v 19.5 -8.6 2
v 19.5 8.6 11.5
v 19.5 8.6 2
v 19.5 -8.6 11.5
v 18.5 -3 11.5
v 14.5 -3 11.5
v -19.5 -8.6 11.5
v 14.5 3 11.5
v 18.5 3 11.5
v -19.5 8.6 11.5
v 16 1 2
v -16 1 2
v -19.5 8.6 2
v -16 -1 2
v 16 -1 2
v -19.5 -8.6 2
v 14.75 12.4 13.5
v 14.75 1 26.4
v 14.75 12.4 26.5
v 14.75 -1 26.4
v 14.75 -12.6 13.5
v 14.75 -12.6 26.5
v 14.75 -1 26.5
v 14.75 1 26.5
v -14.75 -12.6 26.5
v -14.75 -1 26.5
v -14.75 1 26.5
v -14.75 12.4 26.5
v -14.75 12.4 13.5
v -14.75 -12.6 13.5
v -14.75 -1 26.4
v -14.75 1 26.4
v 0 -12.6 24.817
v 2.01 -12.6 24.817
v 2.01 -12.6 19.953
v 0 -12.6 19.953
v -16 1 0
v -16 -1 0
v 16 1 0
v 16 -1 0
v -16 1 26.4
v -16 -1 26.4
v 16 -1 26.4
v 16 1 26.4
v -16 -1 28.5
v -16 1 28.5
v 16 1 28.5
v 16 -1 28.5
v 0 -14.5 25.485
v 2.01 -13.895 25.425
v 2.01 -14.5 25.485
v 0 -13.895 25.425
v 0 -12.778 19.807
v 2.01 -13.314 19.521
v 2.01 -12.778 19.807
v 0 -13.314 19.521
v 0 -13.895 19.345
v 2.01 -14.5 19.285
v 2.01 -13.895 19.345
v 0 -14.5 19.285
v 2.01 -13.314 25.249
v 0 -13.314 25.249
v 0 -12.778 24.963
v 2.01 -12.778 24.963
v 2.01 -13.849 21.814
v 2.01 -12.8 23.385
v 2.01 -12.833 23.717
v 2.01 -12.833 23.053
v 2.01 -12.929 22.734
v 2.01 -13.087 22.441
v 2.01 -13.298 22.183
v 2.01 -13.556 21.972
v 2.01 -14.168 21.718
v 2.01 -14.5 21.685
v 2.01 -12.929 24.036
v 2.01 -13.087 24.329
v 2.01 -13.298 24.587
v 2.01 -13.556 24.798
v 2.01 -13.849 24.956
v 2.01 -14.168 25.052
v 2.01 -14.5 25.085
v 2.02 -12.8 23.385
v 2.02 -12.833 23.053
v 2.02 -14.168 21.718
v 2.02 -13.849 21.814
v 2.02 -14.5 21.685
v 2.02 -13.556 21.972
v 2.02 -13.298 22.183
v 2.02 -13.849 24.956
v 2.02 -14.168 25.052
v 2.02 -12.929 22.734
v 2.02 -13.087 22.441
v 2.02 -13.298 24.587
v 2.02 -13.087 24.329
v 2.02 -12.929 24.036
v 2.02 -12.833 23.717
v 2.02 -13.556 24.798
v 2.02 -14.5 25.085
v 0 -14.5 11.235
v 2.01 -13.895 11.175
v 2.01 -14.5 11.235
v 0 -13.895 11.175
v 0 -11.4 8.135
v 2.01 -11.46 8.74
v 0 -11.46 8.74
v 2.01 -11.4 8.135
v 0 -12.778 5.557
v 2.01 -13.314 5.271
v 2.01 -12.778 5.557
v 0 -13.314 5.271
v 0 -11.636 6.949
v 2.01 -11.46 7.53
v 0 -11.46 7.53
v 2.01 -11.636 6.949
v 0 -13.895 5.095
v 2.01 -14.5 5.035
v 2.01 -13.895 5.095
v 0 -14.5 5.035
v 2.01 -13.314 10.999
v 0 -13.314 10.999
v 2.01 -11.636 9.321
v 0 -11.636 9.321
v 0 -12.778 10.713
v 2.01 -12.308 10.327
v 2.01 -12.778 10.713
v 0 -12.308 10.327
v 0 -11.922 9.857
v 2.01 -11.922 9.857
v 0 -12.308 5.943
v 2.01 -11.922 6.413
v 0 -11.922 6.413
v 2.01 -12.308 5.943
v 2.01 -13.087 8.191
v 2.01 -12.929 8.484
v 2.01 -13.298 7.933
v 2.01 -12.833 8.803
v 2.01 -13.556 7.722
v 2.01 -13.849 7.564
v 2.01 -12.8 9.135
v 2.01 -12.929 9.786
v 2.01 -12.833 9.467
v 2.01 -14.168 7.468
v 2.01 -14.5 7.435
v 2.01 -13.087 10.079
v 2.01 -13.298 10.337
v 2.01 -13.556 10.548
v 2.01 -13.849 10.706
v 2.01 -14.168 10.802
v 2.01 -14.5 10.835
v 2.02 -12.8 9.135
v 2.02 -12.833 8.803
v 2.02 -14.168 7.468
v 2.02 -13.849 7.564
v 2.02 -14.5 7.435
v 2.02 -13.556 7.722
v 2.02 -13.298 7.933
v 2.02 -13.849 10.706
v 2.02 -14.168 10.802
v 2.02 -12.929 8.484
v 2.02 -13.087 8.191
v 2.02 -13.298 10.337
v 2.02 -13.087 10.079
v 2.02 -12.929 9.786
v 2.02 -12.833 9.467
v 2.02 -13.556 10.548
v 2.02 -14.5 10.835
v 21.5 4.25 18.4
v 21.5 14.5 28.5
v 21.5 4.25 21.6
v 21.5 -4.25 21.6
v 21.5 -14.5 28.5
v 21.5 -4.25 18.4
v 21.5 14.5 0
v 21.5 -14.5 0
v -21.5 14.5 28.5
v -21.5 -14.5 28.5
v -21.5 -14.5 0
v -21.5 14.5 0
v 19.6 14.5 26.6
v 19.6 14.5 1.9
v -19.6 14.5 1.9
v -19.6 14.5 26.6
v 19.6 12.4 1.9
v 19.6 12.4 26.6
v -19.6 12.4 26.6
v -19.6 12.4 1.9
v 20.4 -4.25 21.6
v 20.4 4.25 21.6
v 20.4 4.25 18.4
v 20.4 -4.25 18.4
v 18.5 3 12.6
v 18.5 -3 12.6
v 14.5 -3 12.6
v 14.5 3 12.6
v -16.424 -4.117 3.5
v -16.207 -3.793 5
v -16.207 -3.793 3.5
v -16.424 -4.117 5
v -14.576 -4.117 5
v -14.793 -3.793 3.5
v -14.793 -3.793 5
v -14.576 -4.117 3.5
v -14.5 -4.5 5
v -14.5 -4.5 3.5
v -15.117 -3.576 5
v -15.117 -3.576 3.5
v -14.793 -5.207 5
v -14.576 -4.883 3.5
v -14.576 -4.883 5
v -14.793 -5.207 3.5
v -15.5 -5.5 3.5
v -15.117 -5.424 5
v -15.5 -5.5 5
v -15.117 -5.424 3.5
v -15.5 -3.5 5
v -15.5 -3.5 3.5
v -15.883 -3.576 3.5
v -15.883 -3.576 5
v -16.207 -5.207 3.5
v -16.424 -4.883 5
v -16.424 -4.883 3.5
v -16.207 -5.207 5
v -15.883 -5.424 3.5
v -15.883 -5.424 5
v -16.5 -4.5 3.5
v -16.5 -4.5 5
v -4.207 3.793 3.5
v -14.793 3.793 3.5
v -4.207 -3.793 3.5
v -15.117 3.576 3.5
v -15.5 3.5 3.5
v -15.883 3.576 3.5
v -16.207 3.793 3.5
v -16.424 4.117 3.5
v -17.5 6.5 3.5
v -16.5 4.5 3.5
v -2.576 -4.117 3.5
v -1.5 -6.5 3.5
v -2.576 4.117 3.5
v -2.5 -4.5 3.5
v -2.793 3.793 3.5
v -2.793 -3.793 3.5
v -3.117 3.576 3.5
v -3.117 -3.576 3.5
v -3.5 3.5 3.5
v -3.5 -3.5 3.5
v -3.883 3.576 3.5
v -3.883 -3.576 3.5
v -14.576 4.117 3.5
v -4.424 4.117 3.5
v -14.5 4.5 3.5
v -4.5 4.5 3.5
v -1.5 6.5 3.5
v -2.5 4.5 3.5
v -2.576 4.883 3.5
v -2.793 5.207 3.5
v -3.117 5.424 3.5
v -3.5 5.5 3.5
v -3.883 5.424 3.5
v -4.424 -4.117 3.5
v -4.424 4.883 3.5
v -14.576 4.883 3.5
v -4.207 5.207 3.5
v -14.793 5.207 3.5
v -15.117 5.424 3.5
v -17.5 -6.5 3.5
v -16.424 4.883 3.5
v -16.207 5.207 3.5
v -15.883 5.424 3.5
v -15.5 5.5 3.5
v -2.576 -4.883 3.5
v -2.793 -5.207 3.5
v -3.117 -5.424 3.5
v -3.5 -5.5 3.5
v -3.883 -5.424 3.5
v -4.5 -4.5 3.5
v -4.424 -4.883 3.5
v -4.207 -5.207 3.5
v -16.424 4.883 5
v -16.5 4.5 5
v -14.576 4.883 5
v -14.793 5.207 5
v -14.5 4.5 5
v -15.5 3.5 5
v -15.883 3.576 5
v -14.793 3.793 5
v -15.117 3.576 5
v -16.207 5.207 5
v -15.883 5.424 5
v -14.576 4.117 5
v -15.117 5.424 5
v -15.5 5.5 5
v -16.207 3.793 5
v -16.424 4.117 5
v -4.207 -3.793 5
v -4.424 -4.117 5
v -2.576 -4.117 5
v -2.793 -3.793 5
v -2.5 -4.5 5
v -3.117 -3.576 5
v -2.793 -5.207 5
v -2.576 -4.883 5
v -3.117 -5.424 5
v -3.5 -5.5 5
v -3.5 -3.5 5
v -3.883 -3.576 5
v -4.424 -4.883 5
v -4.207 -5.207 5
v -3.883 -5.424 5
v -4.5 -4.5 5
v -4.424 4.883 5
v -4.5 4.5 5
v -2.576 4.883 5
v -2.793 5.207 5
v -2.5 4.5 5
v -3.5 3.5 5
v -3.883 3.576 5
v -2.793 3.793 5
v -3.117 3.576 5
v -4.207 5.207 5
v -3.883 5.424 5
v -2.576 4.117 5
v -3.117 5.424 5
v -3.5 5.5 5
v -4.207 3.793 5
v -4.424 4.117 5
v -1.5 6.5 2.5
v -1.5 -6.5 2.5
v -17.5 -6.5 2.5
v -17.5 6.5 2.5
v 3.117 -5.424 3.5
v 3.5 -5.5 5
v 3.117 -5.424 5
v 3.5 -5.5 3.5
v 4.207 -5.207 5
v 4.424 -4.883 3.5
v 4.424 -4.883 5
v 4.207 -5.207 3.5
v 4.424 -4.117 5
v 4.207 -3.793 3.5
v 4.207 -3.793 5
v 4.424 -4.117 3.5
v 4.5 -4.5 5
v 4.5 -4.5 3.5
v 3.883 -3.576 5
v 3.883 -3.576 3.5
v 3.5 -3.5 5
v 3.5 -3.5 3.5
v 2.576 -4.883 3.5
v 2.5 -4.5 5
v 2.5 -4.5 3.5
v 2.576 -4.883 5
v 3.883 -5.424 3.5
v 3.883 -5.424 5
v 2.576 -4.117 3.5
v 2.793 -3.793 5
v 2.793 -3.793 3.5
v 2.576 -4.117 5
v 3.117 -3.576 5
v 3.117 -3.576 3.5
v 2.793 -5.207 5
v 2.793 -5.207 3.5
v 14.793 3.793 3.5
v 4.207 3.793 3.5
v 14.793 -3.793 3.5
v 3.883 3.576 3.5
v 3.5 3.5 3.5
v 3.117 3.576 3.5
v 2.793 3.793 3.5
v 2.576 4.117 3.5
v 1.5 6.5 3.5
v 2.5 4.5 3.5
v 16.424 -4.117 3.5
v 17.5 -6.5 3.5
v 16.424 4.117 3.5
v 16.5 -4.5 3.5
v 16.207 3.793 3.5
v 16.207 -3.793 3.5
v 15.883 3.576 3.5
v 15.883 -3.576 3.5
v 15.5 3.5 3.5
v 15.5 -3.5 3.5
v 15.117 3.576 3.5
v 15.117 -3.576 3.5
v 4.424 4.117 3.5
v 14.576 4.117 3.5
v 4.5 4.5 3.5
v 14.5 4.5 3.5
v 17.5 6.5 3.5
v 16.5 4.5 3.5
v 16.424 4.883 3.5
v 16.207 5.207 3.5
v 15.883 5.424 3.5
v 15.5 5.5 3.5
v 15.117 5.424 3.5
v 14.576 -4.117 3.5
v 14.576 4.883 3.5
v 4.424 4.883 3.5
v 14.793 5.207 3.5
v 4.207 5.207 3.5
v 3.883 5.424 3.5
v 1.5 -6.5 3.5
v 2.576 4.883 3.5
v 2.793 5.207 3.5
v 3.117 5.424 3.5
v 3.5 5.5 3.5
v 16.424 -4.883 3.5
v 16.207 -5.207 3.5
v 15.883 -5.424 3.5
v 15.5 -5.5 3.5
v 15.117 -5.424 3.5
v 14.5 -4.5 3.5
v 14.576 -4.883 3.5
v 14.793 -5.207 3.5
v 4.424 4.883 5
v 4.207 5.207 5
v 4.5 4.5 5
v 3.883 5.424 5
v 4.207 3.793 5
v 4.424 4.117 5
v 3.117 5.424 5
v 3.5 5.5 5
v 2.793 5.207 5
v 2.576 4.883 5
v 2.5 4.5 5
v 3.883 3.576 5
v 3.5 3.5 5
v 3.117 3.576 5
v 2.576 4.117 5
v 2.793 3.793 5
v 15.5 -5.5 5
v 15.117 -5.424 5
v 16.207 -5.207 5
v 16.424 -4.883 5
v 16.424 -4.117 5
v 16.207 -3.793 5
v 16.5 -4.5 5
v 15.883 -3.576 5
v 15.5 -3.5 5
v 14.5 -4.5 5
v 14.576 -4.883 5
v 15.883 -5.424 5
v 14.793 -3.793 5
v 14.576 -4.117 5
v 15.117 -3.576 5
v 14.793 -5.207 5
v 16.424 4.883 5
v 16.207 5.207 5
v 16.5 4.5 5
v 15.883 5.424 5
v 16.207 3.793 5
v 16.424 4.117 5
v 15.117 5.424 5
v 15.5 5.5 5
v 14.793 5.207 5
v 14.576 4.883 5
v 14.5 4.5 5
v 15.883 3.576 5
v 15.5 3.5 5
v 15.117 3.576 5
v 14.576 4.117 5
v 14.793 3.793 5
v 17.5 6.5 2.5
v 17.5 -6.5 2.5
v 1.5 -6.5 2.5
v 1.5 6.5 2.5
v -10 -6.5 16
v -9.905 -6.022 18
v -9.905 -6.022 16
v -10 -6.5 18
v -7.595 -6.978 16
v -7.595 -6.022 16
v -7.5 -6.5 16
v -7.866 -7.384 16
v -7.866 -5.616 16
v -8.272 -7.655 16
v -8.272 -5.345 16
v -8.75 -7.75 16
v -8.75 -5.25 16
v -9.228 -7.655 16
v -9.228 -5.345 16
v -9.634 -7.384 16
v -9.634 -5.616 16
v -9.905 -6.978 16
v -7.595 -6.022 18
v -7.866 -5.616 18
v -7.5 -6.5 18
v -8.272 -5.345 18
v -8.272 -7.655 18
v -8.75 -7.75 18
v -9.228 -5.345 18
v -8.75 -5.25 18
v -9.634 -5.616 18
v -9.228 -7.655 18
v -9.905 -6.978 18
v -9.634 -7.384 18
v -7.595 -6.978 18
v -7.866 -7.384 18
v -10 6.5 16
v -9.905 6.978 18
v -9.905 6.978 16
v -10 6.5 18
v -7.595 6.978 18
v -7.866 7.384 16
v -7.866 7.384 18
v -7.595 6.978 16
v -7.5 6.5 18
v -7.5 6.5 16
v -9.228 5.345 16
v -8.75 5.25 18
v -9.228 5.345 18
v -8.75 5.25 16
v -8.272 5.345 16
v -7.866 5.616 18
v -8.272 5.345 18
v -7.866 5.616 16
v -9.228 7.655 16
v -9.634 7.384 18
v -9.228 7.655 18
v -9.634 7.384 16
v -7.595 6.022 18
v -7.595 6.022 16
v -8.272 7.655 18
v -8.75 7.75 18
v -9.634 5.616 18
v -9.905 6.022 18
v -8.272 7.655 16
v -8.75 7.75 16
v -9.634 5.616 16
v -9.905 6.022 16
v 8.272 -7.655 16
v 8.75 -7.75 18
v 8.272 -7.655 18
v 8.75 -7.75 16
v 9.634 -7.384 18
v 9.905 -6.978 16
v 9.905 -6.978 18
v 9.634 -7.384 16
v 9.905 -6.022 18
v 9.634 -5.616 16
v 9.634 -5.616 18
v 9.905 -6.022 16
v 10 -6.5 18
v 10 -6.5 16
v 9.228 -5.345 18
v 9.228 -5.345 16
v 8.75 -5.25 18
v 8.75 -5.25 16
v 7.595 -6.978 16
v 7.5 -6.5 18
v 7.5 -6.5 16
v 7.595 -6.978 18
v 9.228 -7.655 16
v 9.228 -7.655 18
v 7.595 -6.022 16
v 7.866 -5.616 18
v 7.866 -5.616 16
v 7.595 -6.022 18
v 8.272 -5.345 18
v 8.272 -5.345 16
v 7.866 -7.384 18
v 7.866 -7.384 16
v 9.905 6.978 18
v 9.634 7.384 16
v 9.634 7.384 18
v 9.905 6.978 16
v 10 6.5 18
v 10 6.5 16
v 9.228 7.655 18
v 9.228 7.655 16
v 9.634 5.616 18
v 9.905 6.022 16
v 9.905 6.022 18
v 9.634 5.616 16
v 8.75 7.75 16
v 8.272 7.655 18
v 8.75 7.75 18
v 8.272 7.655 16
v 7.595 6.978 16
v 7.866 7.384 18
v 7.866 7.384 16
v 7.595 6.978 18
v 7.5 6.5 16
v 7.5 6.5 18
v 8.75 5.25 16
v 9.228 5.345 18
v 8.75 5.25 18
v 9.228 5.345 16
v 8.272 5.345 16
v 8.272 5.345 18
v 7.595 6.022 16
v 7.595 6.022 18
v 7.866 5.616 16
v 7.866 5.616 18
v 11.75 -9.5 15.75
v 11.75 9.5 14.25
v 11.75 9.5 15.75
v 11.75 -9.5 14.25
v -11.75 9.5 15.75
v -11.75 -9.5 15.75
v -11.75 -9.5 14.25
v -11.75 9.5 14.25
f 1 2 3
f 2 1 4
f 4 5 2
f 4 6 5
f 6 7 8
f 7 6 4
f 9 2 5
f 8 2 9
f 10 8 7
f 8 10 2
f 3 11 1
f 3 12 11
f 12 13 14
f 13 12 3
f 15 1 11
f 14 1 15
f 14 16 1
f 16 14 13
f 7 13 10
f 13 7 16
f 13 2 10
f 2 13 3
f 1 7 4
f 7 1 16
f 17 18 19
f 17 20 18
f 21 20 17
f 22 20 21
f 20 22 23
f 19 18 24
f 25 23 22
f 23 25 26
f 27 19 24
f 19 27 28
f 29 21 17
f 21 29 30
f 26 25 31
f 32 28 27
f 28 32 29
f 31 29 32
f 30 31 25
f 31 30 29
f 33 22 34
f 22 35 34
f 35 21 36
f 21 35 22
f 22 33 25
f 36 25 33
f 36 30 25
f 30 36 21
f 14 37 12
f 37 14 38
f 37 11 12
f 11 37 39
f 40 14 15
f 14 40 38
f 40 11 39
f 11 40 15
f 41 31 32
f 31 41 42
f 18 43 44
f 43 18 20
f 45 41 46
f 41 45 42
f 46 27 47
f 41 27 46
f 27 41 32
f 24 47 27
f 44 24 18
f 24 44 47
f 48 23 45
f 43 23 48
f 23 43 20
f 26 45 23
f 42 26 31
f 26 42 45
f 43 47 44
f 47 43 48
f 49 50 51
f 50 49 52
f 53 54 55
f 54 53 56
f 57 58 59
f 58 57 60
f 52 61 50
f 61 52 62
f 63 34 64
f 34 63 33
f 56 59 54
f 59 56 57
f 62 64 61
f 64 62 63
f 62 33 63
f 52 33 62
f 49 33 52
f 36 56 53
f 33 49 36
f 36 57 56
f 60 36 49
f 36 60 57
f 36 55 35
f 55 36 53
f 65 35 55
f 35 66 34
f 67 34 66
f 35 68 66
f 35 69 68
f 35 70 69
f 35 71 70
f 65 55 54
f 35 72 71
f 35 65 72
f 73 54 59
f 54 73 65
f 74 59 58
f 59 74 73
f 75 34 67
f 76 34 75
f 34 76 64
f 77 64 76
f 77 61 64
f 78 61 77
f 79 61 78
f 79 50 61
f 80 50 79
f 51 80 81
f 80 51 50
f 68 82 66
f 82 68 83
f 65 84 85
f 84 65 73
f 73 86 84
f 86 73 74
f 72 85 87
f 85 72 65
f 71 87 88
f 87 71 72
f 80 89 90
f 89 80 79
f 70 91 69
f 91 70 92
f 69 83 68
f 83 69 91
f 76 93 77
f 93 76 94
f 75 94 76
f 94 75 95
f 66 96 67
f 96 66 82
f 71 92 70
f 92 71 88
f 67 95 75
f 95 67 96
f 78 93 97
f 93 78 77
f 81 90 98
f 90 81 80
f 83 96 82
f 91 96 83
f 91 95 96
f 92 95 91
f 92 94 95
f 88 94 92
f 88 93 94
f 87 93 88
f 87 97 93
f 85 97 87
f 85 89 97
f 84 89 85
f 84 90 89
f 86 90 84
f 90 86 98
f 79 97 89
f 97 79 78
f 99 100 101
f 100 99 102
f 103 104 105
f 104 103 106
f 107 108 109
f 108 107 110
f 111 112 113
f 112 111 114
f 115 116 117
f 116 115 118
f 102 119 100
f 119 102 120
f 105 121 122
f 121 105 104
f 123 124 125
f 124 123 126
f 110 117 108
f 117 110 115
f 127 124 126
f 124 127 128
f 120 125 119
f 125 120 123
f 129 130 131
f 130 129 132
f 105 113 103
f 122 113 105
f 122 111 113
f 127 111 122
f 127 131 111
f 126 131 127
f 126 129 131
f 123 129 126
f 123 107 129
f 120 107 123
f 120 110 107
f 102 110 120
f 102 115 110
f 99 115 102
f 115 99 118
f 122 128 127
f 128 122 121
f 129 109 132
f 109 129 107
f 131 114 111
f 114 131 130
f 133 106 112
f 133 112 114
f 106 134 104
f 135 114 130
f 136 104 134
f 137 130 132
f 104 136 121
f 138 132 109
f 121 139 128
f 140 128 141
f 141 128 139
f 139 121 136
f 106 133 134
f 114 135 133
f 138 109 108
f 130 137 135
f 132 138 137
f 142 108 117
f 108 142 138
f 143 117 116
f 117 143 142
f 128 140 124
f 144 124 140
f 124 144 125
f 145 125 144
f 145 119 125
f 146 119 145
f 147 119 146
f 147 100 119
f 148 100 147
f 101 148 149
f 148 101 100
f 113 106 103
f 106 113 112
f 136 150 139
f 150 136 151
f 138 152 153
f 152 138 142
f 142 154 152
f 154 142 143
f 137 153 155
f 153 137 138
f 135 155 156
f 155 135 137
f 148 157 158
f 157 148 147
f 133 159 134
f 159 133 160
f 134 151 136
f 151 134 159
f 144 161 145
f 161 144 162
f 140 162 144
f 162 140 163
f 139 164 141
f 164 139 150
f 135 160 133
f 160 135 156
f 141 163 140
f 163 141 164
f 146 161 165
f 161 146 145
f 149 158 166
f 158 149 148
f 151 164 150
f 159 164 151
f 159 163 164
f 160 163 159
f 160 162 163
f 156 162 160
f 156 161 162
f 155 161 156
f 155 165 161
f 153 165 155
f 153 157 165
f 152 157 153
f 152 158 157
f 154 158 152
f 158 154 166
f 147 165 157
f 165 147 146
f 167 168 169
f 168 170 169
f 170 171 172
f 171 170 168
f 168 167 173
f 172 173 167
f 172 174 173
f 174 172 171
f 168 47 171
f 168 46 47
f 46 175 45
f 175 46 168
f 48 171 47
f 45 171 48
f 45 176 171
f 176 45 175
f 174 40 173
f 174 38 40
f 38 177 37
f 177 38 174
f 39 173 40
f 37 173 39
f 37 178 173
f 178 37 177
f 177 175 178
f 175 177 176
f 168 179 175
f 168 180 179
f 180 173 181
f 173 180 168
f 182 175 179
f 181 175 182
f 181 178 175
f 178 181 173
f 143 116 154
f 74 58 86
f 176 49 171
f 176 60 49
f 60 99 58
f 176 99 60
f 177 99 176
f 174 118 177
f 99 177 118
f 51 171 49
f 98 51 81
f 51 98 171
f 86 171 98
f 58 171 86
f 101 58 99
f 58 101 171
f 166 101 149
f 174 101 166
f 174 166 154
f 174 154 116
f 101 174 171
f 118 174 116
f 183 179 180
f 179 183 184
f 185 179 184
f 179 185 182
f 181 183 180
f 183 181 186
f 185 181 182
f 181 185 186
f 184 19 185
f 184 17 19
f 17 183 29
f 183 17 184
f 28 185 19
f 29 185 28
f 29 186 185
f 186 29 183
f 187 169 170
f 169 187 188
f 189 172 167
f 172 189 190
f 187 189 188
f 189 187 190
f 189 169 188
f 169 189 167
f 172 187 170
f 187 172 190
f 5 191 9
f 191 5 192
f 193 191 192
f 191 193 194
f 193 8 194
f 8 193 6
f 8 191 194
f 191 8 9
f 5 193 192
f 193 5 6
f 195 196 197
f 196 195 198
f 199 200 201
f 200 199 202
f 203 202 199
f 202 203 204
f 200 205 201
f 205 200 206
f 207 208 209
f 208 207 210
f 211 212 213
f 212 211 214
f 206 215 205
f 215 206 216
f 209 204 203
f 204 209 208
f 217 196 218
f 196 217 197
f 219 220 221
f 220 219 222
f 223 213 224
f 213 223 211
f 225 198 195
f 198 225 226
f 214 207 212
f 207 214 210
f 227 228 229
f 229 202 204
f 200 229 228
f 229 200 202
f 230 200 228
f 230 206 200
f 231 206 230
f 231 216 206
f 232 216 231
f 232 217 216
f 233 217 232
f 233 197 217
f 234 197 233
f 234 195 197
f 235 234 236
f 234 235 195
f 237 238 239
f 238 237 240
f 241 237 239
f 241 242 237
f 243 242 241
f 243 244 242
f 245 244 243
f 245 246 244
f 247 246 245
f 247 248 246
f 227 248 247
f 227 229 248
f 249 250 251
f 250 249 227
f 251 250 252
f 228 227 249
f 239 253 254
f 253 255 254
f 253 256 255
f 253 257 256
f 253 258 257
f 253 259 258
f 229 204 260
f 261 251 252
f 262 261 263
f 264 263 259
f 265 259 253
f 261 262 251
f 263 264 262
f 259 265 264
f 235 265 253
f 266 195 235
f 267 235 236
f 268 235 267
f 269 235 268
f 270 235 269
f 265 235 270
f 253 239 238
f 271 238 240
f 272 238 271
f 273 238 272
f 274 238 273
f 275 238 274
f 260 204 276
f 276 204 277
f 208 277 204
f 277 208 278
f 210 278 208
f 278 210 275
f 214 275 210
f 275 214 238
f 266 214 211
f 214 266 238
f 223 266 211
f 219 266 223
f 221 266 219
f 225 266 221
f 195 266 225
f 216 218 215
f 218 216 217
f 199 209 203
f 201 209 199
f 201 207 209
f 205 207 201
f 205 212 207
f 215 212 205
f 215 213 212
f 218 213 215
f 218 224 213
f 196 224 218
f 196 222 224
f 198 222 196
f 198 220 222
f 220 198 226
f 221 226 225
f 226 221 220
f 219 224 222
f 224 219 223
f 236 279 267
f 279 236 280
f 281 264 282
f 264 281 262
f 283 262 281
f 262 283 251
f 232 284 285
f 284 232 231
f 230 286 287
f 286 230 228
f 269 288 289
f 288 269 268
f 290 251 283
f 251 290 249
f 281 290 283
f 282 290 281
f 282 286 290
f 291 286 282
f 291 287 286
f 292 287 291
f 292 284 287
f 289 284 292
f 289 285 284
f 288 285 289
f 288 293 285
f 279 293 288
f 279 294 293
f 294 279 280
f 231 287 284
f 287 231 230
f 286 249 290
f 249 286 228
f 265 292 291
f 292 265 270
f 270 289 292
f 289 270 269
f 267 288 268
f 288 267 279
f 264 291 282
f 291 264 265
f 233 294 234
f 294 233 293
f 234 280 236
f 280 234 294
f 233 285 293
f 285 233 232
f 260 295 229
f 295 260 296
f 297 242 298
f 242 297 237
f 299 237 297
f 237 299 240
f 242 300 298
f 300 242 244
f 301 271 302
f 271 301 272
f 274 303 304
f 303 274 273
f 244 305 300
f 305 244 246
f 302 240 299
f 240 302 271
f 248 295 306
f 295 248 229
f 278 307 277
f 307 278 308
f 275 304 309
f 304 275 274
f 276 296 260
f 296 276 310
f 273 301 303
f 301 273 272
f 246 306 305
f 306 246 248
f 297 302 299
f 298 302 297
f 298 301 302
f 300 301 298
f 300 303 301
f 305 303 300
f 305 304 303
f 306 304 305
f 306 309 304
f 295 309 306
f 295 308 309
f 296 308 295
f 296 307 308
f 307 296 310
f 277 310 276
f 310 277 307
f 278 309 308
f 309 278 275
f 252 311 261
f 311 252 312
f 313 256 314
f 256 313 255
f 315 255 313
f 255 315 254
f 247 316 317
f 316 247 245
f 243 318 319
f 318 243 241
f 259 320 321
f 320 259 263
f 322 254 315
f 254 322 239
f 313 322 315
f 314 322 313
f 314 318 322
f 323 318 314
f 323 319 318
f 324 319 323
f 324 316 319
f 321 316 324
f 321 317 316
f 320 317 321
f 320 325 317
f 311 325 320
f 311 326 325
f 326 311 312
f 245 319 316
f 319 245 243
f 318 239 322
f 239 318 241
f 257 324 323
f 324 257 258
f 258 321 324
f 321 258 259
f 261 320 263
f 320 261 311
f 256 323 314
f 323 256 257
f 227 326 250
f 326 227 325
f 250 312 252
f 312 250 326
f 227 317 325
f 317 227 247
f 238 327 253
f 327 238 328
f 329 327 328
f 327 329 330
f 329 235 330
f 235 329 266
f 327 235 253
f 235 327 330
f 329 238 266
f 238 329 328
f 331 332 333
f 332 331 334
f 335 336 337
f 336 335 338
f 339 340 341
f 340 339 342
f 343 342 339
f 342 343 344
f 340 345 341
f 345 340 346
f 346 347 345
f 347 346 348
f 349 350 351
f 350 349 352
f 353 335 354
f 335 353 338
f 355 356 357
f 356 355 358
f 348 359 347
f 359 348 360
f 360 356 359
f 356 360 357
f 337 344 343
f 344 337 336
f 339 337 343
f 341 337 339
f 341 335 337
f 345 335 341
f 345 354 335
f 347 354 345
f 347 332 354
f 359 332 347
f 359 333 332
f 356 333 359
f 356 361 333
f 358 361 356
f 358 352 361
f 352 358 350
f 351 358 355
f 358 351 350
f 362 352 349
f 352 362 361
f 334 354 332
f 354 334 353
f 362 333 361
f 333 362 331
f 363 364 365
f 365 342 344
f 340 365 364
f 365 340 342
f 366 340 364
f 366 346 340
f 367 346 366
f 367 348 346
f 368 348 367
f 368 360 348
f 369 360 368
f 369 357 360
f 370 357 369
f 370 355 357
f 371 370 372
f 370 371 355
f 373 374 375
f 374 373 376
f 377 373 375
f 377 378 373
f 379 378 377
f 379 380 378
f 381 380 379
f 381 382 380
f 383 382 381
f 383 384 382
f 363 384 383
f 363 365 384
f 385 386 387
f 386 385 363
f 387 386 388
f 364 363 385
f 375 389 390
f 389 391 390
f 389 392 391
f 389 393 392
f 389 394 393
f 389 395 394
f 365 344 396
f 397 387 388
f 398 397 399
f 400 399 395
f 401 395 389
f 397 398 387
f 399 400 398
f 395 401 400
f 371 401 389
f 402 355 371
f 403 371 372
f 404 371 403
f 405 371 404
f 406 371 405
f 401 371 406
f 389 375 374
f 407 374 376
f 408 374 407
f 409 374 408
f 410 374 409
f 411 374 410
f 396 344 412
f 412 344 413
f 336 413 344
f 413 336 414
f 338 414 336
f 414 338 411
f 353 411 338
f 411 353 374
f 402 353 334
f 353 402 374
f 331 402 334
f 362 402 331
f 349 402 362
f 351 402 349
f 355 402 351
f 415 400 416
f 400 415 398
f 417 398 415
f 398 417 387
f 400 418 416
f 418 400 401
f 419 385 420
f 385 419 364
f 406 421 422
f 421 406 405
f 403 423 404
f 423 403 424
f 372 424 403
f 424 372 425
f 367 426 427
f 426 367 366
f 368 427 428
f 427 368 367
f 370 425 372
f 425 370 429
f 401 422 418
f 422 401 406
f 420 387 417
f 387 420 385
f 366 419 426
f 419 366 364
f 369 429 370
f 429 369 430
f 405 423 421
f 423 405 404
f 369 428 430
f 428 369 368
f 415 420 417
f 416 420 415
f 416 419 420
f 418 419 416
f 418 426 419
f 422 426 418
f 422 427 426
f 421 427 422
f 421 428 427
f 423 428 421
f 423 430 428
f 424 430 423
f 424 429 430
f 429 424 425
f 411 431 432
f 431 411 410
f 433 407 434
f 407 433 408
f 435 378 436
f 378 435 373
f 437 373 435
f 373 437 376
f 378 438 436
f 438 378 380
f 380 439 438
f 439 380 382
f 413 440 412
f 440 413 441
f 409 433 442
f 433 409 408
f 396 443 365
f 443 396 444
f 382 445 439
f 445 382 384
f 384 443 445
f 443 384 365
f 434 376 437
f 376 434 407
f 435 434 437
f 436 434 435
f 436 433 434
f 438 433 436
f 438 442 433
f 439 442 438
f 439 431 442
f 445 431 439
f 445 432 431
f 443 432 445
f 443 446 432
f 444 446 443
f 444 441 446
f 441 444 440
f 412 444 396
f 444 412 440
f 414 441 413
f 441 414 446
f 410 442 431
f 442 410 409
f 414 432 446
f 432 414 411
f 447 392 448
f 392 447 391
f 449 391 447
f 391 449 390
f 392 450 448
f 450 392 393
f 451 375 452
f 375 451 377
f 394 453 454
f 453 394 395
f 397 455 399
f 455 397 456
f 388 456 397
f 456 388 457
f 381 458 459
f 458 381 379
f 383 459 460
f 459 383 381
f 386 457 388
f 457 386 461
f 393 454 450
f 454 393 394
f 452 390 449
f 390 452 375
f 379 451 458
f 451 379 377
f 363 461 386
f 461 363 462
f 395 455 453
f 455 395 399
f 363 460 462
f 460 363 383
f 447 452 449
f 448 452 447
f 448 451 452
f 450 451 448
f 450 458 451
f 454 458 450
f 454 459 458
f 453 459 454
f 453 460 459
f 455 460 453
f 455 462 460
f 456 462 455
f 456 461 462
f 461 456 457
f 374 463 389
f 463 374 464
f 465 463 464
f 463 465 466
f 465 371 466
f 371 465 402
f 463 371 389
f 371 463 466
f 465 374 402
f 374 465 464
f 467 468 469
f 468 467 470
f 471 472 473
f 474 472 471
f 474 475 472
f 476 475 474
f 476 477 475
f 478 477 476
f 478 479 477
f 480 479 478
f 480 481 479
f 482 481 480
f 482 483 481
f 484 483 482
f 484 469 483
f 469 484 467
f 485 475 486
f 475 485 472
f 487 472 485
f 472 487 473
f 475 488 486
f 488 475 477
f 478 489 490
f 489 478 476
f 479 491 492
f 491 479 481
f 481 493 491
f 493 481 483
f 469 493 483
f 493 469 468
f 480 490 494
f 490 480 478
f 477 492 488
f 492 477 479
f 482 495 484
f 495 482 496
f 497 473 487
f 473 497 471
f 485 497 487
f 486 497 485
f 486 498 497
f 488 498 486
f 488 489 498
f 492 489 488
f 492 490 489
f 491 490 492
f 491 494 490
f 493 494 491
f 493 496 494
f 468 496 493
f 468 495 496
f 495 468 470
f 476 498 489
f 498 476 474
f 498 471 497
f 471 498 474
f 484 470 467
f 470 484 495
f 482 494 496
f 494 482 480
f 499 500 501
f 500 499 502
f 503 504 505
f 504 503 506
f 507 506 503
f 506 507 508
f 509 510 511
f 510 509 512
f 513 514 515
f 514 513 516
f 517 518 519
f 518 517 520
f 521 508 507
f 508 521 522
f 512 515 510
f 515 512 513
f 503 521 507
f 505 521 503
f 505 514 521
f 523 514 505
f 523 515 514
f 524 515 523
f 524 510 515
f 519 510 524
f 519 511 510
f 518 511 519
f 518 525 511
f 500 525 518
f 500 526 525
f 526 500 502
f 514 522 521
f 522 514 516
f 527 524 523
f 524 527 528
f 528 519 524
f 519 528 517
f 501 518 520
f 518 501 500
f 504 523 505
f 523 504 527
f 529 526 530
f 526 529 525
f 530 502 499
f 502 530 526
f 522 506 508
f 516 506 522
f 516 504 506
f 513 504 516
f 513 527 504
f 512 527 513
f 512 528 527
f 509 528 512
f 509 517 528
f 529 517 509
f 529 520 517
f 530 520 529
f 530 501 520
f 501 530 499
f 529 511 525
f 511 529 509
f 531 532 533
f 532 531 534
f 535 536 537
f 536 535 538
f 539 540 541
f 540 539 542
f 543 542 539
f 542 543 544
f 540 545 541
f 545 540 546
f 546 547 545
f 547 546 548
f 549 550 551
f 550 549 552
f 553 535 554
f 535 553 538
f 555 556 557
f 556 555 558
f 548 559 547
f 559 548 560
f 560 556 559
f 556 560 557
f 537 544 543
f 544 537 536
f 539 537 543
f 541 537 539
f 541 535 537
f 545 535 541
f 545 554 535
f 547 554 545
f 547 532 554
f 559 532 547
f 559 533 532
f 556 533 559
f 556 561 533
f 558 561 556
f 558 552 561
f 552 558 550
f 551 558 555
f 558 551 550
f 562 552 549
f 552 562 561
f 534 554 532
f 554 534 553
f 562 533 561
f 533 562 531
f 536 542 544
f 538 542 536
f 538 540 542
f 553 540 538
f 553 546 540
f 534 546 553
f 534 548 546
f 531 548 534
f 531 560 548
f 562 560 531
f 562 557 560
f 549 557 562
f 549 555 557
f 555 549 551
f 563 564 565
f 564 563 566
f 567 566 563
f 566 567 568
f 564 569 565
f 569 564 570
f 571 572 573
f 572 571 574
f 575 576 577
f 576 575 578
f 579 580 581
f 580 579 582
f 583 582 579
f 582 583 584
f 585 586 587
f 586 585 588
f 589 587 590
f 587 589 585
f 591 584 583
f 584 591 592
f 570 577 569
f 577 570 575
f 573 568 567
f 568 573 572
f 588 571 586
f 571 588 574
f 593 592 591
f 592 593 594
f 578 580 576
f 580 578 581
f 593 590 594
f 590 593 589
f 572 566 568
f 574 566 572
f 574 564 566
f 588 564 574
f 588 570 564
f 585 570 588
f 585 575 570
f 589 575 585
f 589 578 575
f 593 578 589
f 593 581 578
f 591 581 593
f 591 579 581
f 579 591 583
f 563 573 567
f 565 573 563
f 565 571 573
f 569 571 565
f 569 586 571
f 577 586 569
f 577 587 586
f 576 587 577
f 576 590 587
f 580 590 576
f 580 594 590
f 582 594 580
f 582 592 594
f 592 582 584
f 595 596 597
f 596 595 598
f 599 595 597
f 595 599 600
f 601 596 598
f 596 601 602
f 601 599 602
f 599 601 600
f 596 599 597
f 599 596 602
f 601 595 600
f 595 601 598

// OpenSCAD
// =============================================================================
// Lupo Van — Station Météo Intérieure : Boîtier Cheminée
// =============================================================================
// Designer  : Scarabée 🪲, Équipe PKA
// Date      : 2025-07-11
// Licence   : MIT
// Synopsis  : Boîtier paramétrique à deux chambres avec séparation thermique
//             pour ESP32-C3 Super Mini + BME688 + SHT31.
//             Flux d'air passif bas→haut (effet cheminée).
// =============================================================================

/* [Dimensions composants] */
// --- ESP32-C3 Super Mini ---
ESP32_W     = 22.5;  // largeur PCB (mm)
ESP32_D     = 18.0;  // profondeur PCB (mm)
ESP32_H     =  5.5;  // épaisseur avec composants (mm)
ESP32_USBC_W =  8.5; // largeur découpe USB-C (mm)
ESP32_USBC_H =  3.2; // hauteur découpe USB-C (mm)

// --- BME688 breakout ---
BME688_W    = 15.0;
BME688_D    = 12.0;
BME688_H    =  3.0;

// --- SHT31 breakout ---
SHT31_W     = 15.0;
SHT31_D     = 12.0;
SHT31_H     =  3.0;

/* [Tolérances] */
TOLERANCE   = 0.5;   // marge générique sur chaque dimension
WALL        = 2.0;   // épaisseur de paroi (mm)
SEPARATOR   = 2.0;   // épaisseur de la paroi thermique (mm)
FLOOR       = 2.0;   // épaisseur plancher/plafond (mm)

/* [Ventilation] */
VENT_SLOT_W = 2.0;   // largeur d'une fente de ventilation (mm)
VENT_SLOT_L = 12.0;  // longueur d'une fente (mm)
VENT_SPACING = 1.5;  // espacement entre fentes (mm)

/* [Fixation murale] */
M3_CLEARANCE = 3.4;  // diamètre trou de passage M3 (mm)
M3_HEAD_D    = 6.2;  // diamètre tête fraisée M3 (mm)
M3_HEAD_H    = 2.0;  // profondeur fraisure (mm)

/* [Couvercle] */
LID_THICKNESS = 2.0;  // épaisseur du couvercle (mm)
LID_SCREW_D   = 2.2;  // diamètre trou vis M2 couvercle (mm)

/* [Guide lumière LED] */
LED_HOLE_D    = 1.8;  // diamètre trou guide lumière (mm)

// =============================================================================
// Dimensions calculées
// =============================================================================

// Tolérances appliquées
eW = ESP32_W  + 2*TOLERANCE;
eD = ESP32_D  + 2*TOLERANCE;
eH = ESP32_H  + TOLERANCE;

bW = BME688_W + 2*TOLERANCE;
bD = BME688_D + 2*TOLERANCE;
bH = BME688_H + TOLERANCE;

sW = SHT31_W  + 2*TOLERANCE;
sD = SHT31_D  + 2*TOLERANCE;
sH = SHT31_H  + TOLERANCE;

// Chambre basse (capteurs côte à côte le long de X, gap central)
SENSOR_GAP    = 3.0;                        // espace entre les 2 capteurs
CHAMBER_LOW_W = bW + sW + SENSOR_GAP + 4;  // largeur interne chambre basse
CHAMBER_LOW_D = max(bD, sD) + 4;           // profondeur interne
CHAMBER_LOW_H = max(bH, sH) + 6;           // hauteur interne (air + jumpers)

// Chambre haute (ESP32)
CHAMBER_HIGH_W = eW + 6;   // largeur interne
CHAMBER_HIGH_D = eD + 6;   // profondeur interne
CHAMBER_HIGH_H = eH + 7;   // hauteur interne (PCB + USB-C marge)

// Boîtier externe (unifié sur largeur/profondeur max)
BOX_W = max(CHAMBER_LOW_W, CHAMBER_HIGH_W) + 2*WALL;
BOX_D = max(CHAMBER_LOW_D, CHAMBER_HIGH_D) + 2*WALL;
BOX_H = CHAMBER_LOW_H + SEPARATOR + CHAMBER_HIGH_H + 2*FLOOR;

// Origine des chambres en Z (fond du boîtier = Z=0)
LOW_Z_START  = FLOOR;
LOW_Z_END    = LOW_Z_START + CHAMBER_LOW_H;
SEP_Z_START  = LOW_Z_END;
SEP_Z_END    = SEP_Z_START + SEPARATOR;
HIGH_Z_START = SEP_Z_END;
HIGH_Z_END   = HIGH_Z_START + CHAMBER_HIGH_H;

// Positions capteurs (centrés dans la chambre basse)
BME688_X = -bW/2 - SENSOR_GAP/2;
BME688_Y = 0;
SHT31_X  =  sW/2 + SENSOR_GAP/2;
SHT31_Y  = 0;

// Position ESP32 (centré dans la chambre haute)
ESP32_X = 0;
ESP32_Y = 0;

// =============================================================================
// Modules utilitaires
// =============================================================================

// Arrondi 2D pour les angles (fraise à rayon r)
module rounded_square_2d(w, d, r) {
    offset(r = r) square([w - 2*r, d - 2*r], center = true);
}

// =============================================================================
// Module : Ventilation — grille de fentes horizontales
// =============================================================================
module vent_slots(panel_w, panel_d, slot_w, slot_len, spacing, count) {
    // Fentes parallèles à l'axe X (horizontales), empilées en Y
    total_h = count * slot_w + (count - 1) * spacing;
    start_y = -total_h / 2 + slot_w / 2;
    for (i = [0 : count - 1]) {
        translate([0, start_y + i * (slot_w + spacing), 0])
            cube([slot_len, slot_w, panel_d + 0.2], center = true);
    }
}

// =============================================================================
// Module : Trou de fixation M3 fraisé (axe X traversant pour face arrière)
// =============================================================================
module m3_countersunk_hole_x(thickness) {
    // Fraisure côté extérieur
    translate([-thickness/2 - 0.01, 0, 0])
        cylinder(d = M3_HEAD_D, h = M3_HEAD_H + 0.01, $fn = 32);
    // Trou de passage
    translate([-thickness - 0.01, 0, 0])
        cylinder(d = M3_CLEARANCE, h = thickness + 0.02, $fn = 32);
}

// =============================================================================
// Module : Corps principal du boîtier (creux, face avant ouverte)
// =============================================================================
module main_body() {
    difference() {
        // Extérieur plein
        translate([0, 0, BOX_H/2])
            cube([BOX_W, BOX_D, BOX_H], center = true);

        // Cavité intérieure (union des deux chambres + séparateur retiré)
        union() {
            // Chambre basse
            translate([0, 0, LOW_Z_START + CHAMBER_LOW_H/2])
                cube([CHAMBER_LOW_W, CHAMBER_LOW_D + 0.2, CHAMBER_LOW_H], center = true);
            // Chambre haute
            translate([0, 0, HIGH_Z_START + CHAMBER_HIGH_H/2])
                cube([CHAMBER_HIGH_W, CHAMBER_HIGH_D + 0.2, CHAMBER_HIGH_H], center = true);
        }

        // Ouverture façade (tout l'avant, pour le couvercle)
        translate([0, BOX_D/2 - WALL/2, BOX_H/2])
            cube([BOX_W - 2*WALL + 0.2, WALL + 0.2, BOX_H - 2*FLOOR + 0.2], center = true);

        // Découpe USB-C (face droite, chambre haute)
        translate([BOX_W/2, 0, HIGH_Z_START + CHAMBER_HIGH_H/2])
            cube([WALL + 0.2, ESP32_USBC_W, ESP32_USBC_H], center = true);

        // Guide lumière LED (face avant — sera dans le couvercle aussi)
        // Positionnée côté gauche de la chambre haute, en façade
        translate([-BOX_W/4, BOX_D/2 - WALL/2, HIGH_Z_START + CHAMBER_HIGH_H * 0.7])
            rotate([0, 90, 0])
                cylinder(d = LED_HOLE_D, h = WALL + 0.2, center = true, $fn = 24);

        // Ventilation basse (plancher — admission air frais)
        for (jx = [-1, 0, 1]) {
            translate([jx * 10, 0, FLOOR/2])
                cube([VENT_SLOT_L, VENT_SLOT_W, FLOOR + 0.2], center = true);
        }

        // Ventilation haute (plafond — évacuation air chaud)
        for (jx = [-1, 0, 1]) {
            translate([jx * 10, 0, BOX_H - FLOOR/2])
                cube([VENT_SLOT_L, VENT_SLOT_W, FLOOR + 0.2], center = true);
        }

        // Fixations murales M3 (face arrière, 2 points hauts)
        for (mz = [BOX_H * 0.75, BOX_H * 0.25]) {
            translate([0, -BOX_D/2, mz])
                rotate([0, 90, 0])
                    m3_countersunk_hole_x(WALL);
        }

        // Passages fils I2C dans la paroi séparatrice (4 fils)
        // Petit canal excentré pour ne pas gêner les capteurs
        translate([BOX_W/2 - WALL - 3, 0, SEP_Z_START])
            cube([4, 6, SEPARATOR + 0.2], center = true);
    }
}

// =============================================================================
// Module : Support capteurs (berceau dans la chambre basse)
// =============================================================================
module sensor_cradle() {
    // Plots de positionnement pour BME688
    color("LightGreen") {
        translate([BME688_X, BME688_Y, LOW_Z_START + 1])
            cube([bW, bD, 1], center = true);
        // Petits guides anti-glissement
        for (dx = [-bW/2 + 2, bW/2 - 2]) {
            for (dy = [-bD/2 + 2, bD/2 - 2]) {
                translate([BME688_X + dx, BME688_Y + dy, LOW_Z_START + 1.5])
                    cylinder(d = 2, h = 1.5, $fn = 16);
            }
        }
    }

    // Plots de positionnement pour SHT31
    color("LightBlue") {
        translate([SHT31_X, SHT31_Y, LOW_Z_START + 1])
            cube([sW, sD, 1], center = true);
        for (dx = [-sW/2 + 2, sW/2 - 2]) {
            for (dy = [-sD/2 + 2, sD/2 - 2]) {
                translate([SHT31_X + dx, SHT31_Y + dy, LOW_Z_START + 1.5])
                    cylinder(d = 2, h = 1.5, $fn = 16);
            }
        }
    }
}

// =============================================================================
// Module : Support ESP32 (berceau dans la chambre haute)
// =============================================================================
module esp32_cradle() {
    color("SlateBlue") {
        // Plateforme support
        translate([ESP32_X, ESP32_Y, HIGH_Z_START + 1.5])
            cube([eW, eD, 1.5], center = true);
        // Guides anti-glissement
        for (dx = [-eW/2 + 3, eW/2 - 3]) {
            for (dy = [-eD/2 + 3, eD/2 - 3]) {
                translate([ESP32_X + dx, ESP32_Y + dy, HIGH_Z_START + 2.5])
                    cylinder(d = 2.5, h = 2, $fn = 16);
            }
        }
    }
}

// =============================================================================
// Module : Couvercle clipsable avec vis M2 optionnelles
// =============================================================================
module lid() {
    lid_w = BOX_W - 2*WALL;
    lid_h = BOX_H - 2*FLOOR;
    overlap = 1.0; // recouvrement du couvercle sur le pourtour

    difference() {
        union() {
            // Plaque principale
            translate([0, BOX_D/2 - WALL/2 - LID_THICKNESS/2, BOX_H/2])
                cube([lid_w + overlap, LID_THICKNESS, lid_h + overlap], center = true);

            // Lèvre de centrage (pénètre dans l'ouverture)
            translate([0, BOX_D/2 - WALL - 0.5, BOX_H/2])
                cube([lid_w - 0.4, 1.5, lid_h - 0.4], center = true);

            // Ergots de clip (haut et bas, 2 chacun)
            for (zx = [-1, 1]) {
                for (zy = [-1, 1]) {
                    translate([zx * (lid_w/2 - 5), BOX_D/2 - WALL + 0.5, BOX_H/2 + zy * (lid_h/2 - 5)])
                        rotate([0, 45, 0])
                            cube([2, 2, 3], center = true);
                }
            }
        }

        // Trou guide lumière LED (aligné avec celui du corps)
        translate([-BOX_W/4, BOX_D/2 - WALL/2 - LID_THICKNESS/2, HIGH_Z_START + CHAMBER_HIGH_H * 0.7])
            rotate([0, 90, 0])
                cylinder(d = LED_HOLE_D, h = LID_THICKNESS + 0.2, center = true, $fn = 24);

        // Trous vis M2 (2 vis aux coins haut/bas)
        for (zy = [-1, 1]) {
            translate([0, BOX_D/2 - WALL/2 - LID_THICKNESS/2, BOX_H/2 + zy * (lid_h/2 - 6)])
                rotate([0, 90, 0])
                    cylinder(d = LID_SCREW_D, h = LID_THICKNESS + 0.2, center = true, $fn = 24);
        }
    }
}

// =============================================================================
// Assemblage final
// =============================================================================

// Corps principal
main_body();

// Berceaux intérieurs
sensor_cradle();
esp32_cradle();

// Couvercle (désactivé par défaut pour visualisation intérieure)
// Décommenter pour export STL complet :
// lid();

// =============================================================================
// Notes d'impression 3D
// =============================================================================
// - Matériau   : PETG (stabilité thermique, faible conductivité)
// - Imprimante : Prusa Mini+ (plateau 180×180 mm)
// - Orientation : Face arrière sur le plateau (trous de fixation visibles)
// - Support     : Aucun (design auto-porteur)
// - Remplissage : 15-20% gyroïde
// - Périmètres  : 2-3 (rigidité)
// - Buse        : 0.4 mm standard
// - Hauteur couche : 0.20 mm QUALITY
// =============================================================================
